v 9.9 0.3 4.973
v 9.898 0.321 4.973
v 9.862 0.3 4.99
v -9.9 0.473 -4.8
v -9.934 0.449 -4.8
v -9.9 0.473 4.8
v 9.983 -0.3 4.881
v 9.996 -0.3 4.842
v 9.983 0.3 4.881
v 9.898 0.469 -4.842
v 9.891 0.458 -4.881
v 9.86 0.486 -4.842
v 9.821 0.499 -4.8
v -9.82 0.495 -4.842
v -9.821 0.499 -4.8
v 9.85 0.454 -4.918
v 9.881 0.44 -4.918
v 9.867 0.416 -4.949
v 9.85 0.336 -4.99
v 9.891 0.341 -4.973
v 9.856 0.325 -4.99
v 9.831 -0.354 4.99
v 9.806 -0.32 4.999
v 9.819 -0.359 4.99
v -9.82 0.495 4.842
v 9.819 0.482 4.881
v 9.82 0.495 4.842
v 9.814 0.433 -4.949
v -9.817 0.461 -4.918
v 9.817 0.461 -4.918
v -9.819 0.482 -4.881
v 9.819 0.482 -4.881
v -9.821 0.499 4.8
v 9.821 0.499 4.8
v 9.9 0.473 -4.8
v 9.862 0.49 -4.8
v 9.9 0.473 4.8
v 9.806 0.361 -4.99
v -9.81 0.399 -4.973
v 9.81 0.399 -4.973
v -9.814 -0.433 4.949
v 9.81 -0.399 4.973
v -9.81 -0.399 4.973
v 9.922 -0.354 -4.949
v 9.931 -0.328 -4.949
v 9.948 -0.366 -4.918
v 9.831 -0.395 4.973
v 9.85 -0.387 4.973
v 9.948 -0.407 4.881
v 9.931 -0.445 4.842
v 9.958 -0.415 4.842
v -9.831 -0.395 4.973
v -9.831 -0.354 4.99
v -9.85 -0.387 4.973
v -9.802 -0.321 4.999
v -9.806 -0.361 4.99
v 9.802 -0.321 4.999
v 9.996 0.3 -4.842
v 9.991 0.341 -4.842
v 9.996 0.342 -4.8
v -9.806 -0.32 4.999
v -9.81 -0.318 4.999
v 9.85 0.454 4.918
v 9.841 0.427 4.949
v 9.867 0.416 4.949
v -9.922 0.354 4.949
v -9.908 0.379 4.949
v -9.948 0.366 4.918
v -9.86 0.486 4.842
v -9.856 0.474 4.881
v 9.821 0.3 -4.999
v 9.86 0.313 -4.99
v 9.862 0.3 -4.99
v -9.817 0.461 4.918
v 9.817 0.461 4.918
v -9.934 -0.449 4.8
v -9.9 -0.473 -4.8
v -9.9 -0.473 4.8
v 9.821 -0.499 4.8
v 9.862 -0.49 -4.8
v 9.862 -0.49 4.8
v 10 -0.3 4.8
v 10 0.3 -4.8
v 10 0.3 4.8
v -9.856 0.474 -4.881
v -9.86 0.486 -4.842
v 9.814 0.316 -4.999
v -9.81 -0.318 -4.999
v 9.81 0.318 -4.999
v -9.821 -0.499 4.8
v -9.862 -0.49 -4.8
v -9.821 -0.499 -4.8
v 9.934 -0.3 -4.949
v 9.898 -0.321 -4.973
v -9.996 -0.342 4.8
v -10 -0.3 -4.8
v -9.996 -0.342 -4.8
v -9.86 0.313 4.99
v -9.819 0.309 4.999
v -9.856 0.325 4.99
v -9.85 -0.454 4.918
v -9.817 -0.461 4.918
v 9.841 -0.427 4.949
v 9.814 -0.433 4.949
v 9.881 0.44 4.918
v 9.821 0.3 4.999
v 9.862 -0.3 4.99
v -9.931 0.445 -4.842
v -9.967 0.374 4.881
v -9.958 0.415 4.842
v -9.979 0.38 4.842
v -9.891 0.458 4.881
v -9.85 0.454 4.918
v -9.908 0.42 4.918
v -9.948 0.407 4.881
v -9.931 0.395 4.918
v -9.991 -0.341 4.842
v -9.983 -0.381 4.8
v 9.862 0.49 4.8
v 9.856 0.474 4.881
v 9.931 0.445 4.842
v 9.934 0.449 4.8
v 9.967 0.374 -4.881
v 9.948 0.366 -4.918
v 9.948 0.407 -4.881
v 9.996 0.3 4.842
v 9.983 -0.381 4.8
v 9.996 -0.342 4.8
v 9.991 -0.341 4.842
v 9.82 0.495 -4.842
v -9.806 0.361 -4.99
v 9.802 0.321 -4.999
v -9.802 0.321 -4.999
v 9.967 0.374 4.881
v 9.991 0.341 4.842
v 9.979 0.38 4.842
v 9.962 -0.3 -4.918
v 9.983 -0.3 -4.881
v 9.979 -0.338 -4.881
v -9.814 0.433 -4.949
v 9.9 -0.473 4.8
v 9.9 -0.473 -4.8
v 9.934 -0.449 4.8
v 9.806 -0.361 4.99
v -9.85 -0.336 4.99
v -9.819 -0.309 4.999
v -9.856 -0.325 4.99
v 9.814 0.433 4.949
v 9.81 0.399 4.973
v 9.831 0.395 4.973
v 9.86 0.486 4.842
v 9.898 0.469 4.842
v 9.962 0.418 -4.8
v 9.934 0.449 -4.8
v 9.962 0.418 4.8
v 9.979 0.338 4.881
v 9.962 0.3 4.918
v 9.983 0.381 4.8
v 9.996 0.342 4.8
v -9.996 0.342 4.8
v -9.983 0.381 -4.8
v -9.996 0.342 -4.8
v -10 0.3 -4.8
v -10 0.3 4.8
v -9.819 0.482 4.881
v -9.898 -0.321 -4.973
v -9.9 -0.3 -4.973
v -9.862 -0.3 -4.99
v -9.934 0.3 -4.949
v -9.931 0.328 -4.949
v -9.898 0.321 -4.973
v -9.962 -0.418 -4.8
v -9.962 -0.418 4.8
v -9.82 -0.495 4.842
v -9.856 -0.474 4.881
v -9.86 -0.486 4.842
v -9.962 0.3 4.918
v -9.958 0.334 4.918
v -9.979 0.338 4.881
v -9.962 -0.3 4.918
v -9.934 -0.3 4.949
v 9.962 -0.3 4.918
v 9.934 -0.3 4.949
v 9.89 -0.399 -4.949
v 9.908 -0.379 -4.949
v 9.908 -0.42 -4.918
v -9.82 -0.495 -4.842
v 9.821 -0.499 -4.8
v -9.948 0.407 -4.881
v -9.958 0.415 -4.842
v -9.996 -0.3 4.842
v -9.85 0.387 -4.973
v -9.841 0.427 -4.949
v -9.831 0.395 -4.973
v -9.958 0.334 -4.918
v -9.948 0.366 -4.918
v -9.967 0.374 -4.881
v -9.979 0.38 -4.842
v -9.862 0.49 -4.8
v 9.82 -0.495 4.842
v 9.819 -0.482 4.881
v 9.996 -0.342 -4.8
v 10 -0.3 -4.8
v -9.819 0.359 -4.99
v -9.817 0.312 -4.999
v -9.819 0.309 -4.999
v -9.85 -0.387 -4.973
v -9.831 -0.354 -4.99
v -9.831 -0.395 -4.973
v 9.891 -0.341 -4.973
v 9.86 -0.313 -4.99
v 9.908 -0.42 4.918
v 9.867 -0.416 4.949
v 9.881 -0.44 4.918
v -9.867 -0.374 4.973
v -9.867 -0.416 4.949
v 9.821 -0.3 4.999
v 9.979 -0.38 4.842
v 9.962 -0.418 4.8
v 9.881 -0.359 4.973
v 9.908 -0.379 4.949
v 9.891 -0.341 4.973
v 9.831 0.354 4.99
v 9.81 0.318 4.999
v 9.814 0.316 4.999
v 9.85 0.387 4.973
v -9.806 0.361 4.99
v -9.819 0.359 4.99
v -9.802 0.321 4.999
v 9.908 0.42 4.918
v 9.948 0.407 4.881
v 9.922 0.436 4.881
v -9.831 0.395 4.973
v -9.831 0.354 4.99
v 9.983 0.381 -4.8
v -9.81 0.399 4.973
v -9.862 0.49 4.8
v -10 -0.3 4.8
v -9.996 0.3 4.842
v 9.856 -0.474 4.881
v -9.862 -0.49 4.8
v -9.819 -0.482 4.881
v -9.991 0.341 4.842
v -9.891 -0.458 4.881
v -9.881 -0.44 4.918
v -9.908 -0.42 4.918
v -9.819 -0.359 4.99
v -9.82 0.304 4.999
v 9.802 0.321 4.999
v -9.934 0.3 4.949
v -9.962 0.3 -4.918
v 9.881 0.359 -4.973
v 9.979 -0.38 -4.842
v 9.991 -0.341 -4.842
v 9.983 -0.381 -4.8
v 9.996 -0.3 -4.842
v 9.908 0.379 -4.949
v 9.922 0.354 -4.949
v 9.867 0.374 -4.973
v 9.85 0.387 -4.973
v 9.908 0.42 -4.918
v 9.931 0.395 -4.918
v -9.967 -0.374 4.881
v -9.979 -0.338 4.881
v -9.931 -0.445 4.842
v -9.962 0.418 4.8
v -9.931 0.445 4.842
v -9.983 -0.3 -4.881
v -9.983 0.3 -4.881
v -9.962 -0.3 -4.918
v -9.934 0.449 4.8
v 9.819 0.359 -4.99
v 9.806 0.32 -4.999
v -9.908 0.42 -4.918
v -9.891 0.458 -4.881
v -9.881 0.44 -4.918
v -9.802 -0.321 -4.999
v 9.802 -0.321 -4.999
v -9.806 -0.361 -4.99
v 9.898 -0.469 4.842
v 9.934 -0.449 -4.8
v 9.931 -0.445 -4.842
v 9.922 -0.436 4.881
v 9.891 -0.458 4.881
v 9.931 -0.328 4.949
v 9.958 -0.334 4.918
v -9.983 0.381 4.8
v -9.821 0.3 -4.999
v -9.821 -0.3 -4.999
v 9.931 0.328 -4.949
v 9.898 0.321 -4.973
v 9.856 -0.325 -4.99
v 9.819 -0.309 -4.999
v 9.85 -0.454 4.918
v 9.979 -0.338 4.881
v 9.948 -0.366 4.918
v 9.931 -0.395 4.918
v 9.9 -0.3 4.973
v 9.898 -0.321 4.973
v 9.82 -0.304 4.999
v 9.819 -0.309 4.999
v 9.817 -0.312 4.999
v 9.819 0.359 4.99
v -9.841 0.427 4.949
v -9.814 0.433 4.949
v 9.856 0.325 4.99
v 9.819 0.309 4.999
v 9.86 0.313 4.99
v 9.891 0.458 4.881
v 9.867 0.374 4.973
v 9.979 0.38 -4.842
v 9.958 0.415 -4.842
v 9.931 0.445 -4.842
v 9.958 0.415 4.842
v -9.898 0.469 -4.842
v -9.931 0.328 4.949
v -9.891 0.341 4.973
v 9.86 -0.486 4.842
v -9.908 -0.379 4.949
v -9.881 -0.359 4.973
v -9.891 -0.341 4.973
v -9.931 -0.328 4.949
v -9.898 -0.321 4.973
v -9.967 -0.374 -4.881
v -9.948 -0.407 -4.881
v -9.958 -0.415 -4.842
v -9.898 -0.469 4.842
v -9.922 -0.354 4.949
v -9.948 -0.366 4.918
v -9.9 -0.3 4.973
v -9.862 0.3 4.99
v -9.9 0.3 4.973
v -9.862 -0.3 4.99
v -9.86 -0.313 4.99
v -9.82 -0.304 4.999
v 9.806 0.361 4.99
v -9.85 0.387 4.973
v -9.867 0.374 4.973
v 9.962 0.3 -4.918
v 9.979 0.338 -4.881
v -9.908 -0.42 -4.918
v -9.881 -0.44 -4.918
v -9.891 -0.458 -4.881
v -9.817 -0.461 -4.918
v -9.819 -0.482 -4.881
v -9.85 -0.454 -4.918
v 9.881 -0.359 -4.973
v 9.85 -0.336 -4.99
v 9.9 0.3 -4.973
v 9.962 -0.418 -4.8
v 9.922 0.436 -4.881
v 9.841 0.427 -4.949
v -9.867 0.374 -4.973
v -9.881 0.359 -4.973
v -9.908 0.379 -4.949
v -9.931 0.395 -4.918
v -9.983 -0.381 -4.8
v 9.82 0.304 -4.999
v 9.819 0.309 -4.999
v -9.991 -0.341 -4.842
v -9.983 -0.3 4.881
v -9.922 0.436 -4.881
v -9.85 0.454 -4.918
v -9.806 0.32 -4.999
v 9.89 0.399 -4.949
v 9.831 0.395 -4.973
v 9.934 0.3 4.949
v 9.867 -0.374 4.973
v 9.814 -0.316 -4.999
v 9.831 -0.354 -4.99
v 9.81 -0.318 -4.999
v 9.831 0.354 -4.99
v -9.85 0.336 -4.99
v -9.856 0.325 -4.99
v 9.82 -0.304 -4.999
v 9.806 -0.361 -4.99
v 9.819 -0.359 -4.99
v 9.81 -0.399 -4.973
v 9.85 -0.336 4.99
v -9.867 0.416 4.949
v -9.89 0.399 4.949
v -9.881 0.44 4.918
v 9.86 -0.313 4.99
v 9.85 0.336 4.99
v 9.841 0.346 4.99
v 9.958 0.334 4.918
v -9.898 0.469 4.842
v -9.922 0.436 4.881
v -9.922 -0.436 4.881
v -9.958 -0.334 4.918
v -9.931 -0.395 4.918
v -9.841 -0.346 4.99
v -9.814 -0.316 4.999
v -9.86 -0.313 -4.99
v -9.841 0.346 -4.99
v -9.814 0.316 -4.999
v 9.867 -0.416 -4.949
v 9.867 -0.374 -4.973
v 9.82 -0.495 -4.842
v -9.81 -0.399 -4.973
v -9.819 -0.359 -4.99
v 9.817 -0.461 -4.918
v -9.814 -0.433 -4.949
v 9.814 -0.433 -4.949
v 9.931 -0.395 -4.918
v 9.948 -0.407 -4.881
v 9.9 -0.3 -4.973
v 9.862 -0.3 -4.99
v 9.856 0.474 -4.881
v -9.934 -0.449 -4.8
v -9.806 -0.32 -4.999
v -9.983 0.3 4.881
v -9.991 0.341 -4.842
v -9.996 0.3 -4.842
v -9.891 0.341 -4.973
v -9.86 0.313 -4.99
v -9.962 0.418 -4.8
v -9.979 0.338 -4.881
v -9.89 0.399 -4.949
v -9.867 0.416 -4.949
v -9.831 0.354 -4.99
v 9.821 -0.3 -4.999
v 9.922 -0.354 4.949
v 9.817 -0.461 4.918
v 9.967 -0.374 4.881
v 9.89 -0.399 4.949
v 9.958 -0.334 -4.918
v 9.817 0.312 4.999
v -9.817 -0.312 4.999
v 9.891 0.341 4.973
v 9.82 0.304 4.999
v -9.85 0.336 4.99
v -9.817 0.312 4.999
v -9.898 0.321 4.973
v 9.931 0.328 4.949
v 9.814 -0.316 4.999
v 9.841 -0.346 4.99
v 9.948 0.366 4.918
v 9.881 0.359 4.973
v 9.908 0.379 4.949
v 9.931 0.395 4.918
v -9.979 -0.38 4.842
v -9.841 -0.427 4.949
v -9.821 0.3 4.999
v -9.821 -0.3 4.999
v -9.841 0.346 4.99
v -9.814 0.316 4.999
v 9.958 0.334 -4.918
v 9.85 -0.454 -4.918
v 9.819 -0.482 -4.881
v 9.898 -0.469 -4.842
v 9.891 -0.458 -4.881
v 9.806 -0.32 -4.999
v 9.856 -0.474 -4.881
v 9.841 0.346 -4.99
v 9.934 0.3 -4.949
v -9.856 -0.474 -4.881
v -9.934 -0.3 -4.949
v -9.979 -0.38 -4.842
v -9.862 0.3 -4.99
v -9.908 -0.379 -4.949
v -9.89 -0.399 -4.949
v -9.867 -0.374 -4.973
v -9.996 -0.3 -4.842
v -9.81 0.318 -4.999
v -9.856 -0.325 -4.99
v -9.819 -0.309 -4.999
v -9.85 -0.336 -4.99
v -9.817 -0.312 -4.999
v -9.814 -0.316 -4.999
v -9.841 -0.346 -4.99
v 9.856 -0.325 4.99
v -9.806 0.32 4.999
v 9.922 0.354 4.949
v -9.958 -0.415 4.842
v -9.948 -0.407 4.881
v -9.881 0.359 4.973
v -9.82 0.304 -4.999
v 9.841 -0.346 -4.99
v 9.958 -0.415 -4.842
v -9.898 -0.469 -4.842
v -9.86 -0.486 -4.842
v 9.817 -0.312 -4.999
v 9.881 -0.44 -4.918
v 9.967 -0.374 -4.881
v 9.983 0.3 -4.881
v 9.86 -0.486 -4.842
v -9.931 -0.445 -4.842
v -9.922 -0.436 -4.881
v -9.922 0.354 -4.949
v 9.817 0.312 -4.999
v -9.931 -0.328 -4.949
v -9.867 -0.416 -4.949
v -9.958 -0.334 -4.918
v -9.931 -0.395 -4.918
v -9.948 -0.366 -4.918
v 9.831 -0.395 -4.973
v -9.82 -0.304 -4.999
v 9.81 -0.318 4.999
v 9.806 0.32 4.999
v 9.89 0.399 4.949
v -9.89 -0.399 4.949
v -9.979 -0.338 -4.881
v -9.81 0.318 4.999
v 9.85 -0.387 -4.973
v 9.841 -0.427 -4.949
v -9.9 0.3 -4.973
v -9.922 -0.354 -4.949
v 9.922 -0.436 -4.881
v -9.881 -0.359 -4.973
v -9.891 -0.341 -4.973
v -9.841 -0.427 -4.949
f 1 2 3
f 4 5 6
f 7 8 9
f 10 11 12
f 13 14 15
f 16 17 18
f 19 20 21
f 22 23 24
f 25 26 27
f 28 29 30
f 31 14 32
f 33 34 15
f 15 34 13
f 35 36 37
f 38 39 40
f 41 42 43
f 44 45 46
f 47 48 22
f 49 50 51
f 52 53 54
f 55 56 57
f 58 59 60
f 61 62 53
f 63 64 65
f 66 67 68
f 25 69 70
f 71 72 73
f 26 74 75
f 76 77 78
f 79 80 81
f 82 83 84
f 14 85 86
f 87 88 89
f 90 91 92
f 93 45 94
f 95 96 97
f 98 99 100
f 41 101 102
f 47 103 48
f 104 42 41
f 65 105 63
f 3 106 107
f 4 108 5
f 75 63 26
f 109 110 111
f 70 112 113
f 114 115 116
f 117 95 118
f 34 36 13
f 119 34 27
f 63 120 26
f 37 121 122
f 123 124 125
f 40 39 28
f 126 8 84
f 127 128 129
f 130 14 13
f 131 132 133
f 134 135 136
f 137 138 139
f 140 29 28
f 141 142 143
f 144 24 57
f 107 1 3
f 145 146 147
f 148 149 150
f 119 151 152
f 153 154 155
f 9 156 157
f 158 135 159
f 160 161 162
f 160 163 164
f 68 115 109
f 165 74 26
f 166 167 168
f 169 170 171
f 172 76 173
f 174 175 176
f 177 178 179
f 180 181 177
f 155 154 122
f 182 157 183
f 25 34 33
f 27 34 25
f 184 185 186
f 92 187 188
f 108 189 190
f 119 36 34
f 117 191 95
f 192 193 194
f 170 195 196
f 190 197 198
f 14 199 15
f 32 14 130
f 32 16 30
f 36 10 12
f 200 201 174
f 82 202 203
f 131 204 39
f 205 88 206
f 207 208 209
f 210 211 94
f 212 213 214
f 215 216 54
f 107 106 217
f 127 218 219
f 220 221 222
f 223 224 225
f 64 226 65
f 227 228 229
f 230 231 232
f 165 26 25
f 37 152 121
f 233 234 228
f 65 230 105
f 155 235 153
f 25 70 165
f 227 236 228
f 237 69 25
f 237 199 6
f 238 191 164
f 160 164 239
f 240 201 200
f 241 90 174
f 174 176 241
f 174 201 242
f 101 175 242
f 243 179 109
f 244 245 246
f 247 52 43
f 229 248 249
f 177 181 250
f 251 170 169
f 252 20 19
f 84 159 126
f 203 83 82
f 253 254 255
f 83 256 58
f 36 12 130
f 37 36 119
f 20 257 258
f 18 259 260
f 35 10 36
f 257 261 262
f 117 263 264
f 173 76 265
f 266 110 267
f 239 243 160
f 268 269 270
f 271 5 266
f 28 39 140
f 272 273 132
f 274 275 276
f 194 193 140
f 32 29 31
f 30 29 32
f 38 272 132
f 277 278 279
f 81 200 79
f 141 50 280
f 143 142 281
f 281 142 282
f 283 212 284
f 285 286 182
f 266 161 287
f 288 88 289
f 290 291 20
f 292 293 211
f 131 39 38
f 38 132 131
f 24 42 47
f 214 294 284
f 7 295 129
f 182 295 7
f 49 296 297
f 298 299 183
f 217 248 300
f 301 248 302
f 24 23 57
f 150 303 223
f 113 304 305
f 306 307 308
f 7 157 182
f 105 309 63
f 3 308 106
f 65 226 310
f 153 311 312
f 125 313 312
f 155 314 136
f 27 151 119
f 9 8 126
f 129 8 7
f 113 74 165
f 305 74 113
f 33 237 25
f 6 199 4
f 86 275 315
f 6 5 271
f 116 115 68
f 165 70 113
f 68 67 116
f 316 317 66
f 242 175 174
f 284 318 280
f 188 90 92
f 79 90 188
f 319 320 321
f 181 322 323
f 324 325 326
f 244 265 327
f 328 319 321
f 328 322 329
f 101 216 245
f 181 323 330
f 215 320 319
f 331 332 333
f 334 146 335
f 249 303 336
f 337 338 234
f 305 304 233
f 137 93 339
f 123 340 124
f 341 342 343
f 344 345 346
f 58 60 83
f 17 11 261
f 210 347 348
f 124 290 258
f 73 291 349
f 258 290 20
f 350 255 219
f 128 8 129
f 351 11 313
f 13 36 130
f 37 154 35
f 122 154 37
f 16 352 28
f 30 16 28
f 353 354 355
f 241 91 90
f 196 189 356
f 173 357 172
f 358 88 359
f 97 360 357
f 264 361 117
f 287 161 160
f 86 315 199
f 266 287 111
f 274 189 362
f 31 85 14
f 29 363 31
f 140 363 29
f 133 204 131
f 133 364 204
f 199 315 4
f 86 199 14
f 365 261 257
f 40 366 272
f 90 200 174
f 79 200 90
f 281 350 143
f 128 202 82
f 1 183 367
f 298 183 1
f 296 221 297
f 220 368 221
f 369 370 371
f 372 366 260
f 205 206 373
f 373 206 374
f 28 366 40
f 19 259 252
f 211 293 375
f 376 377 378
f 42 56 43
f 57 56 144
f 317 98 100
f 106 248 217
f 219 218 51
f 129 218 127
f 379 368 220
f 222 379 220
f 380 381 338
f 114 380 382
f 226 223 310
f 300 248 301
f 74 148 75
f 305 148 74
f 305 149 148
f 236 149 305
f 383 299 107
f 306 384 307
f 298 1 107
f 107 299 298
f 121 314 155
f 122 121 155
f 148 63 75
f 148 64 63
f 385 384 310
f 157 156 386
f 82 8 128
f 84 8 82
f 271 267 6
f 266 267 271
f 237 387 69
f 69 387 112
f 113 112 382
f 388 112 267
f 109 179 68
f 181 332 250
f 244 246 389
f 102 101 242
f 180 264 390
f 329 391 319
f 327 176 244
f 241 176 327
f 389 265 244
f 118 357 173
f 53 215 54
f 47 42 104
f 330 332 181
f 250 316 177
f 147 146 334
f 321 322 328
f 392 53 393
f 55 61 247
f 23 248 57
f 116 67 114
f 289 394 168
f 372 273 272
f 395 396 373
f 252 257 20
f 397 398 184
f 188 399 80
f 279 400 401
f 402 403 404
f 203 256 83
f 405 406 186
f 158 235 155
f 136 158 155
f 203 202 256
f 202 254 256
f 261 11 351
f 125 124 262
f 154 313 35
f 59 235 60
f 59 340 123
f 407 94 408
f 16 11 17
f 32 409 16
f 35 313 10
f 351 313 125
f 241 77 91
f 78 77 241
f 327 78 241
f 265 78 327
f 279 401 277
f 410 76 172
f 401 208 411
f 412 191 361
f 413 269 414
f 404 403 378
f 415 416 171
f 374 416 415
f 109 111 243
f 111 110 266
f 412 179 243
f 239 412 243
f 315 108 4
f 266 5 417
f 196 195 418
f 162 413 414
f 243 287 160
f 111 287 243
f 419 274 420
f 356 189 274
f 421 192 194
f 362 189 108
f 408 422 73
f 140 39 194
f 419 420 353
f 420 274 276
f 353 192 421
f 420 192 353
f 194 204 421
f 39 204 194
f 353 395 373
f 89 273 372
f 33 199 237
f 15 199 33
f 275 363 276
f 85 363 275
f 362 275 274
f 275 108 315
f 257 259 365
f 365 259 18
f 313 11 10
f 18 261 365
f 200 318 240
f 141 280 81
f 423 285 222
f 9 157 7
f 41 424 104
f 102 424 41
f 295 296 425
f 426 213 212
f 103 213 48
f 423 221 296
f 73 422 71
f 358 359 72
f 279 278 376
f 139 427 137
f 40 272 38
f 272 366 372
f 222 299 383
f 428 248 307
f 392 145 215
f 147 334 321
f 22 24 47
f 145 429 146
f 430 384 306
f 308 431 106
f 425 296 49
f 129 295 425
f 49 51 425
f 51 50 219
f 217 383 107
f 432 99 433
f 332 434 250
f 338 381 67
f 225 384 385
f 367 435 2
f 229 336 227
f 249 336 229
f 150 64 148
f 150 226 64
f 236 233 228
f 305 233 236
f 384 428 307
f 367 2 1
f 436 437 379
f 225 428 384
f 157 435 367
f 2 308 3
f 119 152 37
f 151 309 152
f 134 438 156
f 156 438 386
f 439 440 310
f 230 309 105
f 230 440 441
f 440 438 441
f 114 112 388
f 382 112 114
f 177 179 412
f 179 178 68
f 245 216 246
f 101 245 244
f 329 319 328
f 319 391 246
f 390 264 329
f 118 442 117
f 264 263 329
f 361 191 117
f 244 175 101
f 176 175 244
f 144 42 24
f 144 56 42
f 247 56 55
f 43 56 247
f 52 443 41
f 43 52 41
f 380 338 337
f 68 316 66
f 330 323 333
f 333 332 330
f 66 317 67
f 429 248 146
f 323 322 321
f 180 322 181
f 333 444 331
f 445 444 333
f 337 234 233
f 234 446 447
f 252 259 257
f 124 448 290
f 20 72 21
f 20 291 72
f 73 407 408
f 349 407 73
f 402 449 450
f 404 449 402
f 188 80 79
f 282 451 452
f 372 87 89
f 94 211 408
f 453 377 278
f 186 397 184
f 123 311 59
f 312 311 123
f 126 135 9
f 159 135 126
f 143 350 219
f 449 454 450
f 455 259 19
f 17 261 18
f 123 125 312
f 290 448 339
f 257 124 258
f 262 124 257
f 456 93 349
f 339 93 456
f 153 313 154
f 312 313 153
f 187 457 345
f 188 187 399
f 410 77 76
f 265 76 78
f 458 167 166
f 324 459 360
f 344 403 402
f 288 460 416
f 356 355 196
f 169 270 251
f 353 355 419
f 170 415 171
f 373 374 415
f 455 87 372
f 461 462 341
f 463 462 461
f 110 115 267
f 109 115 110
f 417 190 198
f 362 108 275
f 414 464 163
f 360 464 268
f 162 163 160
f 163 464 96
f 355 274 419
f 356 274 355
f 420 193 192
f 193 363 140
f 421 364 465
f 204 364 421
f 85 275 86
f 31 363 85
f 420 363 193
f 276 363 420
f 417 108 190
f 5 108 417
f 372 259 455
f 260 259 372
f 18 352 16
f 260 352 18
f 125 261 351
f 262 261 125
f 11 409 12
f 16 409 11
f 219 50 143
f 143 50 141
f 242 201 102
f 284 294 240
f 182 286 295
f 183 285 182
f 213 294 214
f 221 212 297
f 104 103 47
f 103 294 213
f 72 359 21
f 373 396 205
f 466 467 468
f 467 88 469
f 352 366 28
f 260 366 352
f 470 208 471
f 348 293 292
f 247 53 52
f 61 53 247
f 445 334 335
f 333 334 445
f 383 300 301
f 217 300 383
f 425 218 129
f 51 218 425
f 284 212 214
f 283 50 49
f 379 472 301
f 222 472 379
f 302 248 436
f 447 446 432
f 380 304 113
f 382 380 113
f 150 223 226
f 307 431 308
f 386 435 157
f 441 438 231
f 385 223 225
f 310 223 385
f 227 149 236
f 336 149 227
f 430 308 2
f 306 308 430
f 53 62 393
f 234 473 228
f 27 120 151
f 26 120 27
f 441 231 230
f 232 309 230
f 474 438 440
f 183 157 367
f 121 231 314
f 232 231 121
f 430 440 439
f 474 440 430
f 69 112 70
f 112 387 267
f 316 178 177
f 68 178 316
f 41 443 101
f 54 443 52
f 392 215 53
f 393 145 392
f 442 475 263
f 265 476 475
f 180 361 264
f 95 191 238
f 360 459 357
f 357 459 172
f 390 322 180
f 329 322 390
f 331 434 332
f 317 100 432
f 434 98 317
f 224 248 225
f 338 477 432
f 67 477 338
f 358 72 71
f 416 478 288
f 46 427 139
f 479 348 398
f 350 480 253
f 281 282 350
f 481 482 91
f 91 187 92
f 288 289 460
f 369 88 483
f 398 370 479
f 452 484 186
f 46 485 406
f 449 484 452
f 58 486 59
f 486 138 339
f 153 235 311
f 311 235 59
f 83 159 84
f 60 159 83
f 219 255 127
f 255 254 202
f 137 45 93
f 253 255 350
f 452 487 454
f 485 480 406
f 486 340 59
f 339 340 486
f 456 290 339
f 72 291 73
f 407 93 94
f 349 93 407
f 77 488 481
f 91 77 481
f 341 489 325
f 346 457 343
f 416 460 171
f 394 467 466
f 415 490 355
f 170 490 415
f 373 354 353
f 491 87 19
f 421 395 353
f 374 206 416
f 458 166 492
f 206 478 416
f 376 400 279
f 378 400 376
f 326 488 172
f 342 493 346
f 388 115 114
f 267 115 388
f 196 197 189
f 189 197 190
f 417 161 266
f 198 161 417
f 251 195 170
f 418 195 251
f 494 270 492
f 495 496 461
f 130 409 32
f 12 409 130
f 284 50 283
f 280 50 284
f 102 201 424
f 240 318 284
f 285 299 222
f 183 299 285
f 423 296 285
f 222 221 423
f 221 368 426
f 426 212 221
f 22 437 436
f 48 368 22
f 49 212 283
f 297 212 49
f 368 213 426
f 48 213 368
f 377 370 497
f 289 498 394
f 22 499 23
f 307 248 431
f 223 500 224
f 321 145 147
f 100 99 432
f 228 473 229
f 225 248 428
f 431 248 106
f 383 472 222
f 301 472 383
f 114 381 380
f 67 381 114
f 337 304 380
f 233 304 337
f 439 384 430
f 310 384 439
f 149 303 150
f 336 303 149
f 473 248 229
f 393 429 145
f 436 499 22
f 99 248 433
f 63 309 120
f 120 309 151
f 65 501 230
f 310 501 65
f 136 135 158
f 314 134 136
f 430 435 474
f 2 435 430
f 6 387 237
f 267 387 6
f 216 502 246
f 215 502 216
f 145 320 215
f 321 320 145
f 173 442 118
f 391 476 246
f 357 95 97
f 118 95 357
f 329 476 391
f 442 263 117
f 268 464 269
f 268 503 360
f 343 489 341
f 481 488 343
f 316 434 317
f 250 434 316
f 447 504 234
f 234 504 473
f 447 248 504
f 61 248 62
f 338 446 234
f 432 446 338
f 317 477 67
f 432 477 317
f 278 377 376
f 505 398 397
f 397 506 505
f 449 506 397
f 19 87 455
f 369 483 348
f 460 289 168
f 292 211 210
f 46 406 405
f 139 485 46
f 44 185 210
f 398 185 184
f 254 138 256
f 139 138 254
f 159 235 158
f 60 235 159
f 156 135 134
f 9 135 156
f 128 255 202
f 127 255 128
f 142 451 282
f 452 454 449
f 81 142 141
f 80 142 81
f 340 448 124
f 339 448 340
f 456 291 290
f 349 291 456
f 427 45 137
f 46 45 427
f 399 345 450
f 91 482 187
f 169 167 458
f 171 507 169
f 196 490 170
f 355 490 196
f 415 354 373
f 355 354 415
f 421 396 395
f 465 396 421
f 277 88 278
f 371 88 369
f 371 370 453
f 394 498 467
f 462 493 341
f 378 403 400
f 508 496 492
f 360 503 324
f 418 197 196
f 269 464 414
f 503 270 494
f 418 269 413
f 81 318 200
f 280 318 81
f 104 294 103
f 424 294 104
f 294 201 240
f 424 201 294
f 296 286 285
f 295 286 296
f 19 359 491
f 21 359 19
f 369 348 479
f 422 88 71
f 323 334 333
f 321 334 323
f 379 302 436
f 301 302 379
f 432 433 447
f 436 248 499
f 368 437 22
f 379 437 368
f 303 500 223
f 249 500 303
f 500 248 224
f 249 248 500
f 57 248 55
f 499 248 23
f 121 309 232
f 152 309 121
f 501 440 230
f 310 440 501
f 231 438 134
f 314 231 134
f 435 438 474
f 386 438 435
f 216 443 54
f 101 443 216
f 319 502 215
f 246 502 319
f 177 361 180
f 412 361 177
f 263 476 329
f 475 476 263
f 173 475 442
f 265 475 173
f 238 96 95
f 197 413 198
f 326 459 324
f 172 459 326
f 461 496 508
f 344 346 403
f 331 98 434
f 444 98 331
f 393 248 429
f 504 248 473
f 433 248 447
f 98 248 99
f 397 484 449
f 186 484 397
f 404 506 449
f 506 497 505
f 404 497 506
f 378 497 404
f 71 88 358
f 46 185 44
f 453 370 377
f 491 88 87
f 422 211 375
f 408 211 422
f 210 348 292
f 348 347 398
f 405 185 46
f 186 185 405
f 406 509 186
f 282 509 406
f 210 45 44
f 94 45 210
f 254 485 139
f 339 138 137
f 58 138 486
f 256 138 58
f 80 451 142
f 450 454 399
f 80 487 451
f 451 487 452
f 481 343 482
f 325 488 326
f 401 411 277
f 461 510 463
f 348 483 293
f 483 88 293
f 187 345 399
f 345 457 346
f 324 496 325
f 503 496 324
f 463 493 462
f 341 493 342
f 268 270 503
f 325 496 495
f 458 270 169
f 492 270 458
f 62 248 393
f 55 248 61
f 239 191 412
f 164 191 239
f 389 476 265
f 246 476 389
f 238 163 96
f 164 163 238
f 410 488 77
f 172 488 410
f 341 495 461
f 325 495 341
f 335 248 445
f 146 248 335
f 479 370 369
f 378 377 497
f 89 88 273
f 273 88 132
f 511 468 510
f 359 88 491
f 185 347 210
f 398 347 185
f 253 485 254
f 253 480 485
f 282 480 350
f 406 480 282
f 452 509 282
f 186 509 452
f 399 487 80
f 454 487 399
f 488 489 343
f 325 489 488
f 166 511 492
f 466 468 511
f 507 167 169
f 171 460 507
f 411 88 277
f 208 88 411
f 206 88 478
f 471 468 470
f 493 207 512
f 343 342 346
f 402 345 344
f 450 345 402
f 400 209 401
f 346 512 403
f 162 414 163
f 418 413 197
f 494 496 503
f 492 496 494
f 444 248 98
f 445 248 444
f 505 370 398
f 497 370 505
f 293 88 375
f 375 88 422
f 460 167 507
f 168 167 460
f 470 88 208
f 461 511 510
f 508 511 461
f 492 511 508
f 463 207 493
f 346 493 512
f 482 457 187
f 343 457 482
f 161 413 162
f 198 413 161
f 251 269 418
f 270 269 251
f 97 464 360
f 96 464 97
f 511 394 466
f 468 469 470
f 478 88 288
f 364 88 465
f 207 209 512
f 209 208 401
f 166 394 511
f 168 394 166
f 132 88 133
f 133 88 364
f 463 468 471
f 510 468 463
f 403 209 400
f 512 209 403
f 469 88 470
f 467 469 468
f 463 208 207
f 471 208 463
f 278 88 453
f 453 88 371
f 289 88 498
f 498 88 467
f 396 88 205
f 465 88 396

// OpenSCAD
//=============================================================================
// Shelf used for placing icons on.
//=============================================================================

module Shelf() {
     minkowski() {
          kDiameter = .4;
          cube([20 - kDiameter, 1 - kDiameter, 10 - kDiameter], center = true);
          sphere(d = kDiameter, $fn = 30);
     }
}

Shelf();
